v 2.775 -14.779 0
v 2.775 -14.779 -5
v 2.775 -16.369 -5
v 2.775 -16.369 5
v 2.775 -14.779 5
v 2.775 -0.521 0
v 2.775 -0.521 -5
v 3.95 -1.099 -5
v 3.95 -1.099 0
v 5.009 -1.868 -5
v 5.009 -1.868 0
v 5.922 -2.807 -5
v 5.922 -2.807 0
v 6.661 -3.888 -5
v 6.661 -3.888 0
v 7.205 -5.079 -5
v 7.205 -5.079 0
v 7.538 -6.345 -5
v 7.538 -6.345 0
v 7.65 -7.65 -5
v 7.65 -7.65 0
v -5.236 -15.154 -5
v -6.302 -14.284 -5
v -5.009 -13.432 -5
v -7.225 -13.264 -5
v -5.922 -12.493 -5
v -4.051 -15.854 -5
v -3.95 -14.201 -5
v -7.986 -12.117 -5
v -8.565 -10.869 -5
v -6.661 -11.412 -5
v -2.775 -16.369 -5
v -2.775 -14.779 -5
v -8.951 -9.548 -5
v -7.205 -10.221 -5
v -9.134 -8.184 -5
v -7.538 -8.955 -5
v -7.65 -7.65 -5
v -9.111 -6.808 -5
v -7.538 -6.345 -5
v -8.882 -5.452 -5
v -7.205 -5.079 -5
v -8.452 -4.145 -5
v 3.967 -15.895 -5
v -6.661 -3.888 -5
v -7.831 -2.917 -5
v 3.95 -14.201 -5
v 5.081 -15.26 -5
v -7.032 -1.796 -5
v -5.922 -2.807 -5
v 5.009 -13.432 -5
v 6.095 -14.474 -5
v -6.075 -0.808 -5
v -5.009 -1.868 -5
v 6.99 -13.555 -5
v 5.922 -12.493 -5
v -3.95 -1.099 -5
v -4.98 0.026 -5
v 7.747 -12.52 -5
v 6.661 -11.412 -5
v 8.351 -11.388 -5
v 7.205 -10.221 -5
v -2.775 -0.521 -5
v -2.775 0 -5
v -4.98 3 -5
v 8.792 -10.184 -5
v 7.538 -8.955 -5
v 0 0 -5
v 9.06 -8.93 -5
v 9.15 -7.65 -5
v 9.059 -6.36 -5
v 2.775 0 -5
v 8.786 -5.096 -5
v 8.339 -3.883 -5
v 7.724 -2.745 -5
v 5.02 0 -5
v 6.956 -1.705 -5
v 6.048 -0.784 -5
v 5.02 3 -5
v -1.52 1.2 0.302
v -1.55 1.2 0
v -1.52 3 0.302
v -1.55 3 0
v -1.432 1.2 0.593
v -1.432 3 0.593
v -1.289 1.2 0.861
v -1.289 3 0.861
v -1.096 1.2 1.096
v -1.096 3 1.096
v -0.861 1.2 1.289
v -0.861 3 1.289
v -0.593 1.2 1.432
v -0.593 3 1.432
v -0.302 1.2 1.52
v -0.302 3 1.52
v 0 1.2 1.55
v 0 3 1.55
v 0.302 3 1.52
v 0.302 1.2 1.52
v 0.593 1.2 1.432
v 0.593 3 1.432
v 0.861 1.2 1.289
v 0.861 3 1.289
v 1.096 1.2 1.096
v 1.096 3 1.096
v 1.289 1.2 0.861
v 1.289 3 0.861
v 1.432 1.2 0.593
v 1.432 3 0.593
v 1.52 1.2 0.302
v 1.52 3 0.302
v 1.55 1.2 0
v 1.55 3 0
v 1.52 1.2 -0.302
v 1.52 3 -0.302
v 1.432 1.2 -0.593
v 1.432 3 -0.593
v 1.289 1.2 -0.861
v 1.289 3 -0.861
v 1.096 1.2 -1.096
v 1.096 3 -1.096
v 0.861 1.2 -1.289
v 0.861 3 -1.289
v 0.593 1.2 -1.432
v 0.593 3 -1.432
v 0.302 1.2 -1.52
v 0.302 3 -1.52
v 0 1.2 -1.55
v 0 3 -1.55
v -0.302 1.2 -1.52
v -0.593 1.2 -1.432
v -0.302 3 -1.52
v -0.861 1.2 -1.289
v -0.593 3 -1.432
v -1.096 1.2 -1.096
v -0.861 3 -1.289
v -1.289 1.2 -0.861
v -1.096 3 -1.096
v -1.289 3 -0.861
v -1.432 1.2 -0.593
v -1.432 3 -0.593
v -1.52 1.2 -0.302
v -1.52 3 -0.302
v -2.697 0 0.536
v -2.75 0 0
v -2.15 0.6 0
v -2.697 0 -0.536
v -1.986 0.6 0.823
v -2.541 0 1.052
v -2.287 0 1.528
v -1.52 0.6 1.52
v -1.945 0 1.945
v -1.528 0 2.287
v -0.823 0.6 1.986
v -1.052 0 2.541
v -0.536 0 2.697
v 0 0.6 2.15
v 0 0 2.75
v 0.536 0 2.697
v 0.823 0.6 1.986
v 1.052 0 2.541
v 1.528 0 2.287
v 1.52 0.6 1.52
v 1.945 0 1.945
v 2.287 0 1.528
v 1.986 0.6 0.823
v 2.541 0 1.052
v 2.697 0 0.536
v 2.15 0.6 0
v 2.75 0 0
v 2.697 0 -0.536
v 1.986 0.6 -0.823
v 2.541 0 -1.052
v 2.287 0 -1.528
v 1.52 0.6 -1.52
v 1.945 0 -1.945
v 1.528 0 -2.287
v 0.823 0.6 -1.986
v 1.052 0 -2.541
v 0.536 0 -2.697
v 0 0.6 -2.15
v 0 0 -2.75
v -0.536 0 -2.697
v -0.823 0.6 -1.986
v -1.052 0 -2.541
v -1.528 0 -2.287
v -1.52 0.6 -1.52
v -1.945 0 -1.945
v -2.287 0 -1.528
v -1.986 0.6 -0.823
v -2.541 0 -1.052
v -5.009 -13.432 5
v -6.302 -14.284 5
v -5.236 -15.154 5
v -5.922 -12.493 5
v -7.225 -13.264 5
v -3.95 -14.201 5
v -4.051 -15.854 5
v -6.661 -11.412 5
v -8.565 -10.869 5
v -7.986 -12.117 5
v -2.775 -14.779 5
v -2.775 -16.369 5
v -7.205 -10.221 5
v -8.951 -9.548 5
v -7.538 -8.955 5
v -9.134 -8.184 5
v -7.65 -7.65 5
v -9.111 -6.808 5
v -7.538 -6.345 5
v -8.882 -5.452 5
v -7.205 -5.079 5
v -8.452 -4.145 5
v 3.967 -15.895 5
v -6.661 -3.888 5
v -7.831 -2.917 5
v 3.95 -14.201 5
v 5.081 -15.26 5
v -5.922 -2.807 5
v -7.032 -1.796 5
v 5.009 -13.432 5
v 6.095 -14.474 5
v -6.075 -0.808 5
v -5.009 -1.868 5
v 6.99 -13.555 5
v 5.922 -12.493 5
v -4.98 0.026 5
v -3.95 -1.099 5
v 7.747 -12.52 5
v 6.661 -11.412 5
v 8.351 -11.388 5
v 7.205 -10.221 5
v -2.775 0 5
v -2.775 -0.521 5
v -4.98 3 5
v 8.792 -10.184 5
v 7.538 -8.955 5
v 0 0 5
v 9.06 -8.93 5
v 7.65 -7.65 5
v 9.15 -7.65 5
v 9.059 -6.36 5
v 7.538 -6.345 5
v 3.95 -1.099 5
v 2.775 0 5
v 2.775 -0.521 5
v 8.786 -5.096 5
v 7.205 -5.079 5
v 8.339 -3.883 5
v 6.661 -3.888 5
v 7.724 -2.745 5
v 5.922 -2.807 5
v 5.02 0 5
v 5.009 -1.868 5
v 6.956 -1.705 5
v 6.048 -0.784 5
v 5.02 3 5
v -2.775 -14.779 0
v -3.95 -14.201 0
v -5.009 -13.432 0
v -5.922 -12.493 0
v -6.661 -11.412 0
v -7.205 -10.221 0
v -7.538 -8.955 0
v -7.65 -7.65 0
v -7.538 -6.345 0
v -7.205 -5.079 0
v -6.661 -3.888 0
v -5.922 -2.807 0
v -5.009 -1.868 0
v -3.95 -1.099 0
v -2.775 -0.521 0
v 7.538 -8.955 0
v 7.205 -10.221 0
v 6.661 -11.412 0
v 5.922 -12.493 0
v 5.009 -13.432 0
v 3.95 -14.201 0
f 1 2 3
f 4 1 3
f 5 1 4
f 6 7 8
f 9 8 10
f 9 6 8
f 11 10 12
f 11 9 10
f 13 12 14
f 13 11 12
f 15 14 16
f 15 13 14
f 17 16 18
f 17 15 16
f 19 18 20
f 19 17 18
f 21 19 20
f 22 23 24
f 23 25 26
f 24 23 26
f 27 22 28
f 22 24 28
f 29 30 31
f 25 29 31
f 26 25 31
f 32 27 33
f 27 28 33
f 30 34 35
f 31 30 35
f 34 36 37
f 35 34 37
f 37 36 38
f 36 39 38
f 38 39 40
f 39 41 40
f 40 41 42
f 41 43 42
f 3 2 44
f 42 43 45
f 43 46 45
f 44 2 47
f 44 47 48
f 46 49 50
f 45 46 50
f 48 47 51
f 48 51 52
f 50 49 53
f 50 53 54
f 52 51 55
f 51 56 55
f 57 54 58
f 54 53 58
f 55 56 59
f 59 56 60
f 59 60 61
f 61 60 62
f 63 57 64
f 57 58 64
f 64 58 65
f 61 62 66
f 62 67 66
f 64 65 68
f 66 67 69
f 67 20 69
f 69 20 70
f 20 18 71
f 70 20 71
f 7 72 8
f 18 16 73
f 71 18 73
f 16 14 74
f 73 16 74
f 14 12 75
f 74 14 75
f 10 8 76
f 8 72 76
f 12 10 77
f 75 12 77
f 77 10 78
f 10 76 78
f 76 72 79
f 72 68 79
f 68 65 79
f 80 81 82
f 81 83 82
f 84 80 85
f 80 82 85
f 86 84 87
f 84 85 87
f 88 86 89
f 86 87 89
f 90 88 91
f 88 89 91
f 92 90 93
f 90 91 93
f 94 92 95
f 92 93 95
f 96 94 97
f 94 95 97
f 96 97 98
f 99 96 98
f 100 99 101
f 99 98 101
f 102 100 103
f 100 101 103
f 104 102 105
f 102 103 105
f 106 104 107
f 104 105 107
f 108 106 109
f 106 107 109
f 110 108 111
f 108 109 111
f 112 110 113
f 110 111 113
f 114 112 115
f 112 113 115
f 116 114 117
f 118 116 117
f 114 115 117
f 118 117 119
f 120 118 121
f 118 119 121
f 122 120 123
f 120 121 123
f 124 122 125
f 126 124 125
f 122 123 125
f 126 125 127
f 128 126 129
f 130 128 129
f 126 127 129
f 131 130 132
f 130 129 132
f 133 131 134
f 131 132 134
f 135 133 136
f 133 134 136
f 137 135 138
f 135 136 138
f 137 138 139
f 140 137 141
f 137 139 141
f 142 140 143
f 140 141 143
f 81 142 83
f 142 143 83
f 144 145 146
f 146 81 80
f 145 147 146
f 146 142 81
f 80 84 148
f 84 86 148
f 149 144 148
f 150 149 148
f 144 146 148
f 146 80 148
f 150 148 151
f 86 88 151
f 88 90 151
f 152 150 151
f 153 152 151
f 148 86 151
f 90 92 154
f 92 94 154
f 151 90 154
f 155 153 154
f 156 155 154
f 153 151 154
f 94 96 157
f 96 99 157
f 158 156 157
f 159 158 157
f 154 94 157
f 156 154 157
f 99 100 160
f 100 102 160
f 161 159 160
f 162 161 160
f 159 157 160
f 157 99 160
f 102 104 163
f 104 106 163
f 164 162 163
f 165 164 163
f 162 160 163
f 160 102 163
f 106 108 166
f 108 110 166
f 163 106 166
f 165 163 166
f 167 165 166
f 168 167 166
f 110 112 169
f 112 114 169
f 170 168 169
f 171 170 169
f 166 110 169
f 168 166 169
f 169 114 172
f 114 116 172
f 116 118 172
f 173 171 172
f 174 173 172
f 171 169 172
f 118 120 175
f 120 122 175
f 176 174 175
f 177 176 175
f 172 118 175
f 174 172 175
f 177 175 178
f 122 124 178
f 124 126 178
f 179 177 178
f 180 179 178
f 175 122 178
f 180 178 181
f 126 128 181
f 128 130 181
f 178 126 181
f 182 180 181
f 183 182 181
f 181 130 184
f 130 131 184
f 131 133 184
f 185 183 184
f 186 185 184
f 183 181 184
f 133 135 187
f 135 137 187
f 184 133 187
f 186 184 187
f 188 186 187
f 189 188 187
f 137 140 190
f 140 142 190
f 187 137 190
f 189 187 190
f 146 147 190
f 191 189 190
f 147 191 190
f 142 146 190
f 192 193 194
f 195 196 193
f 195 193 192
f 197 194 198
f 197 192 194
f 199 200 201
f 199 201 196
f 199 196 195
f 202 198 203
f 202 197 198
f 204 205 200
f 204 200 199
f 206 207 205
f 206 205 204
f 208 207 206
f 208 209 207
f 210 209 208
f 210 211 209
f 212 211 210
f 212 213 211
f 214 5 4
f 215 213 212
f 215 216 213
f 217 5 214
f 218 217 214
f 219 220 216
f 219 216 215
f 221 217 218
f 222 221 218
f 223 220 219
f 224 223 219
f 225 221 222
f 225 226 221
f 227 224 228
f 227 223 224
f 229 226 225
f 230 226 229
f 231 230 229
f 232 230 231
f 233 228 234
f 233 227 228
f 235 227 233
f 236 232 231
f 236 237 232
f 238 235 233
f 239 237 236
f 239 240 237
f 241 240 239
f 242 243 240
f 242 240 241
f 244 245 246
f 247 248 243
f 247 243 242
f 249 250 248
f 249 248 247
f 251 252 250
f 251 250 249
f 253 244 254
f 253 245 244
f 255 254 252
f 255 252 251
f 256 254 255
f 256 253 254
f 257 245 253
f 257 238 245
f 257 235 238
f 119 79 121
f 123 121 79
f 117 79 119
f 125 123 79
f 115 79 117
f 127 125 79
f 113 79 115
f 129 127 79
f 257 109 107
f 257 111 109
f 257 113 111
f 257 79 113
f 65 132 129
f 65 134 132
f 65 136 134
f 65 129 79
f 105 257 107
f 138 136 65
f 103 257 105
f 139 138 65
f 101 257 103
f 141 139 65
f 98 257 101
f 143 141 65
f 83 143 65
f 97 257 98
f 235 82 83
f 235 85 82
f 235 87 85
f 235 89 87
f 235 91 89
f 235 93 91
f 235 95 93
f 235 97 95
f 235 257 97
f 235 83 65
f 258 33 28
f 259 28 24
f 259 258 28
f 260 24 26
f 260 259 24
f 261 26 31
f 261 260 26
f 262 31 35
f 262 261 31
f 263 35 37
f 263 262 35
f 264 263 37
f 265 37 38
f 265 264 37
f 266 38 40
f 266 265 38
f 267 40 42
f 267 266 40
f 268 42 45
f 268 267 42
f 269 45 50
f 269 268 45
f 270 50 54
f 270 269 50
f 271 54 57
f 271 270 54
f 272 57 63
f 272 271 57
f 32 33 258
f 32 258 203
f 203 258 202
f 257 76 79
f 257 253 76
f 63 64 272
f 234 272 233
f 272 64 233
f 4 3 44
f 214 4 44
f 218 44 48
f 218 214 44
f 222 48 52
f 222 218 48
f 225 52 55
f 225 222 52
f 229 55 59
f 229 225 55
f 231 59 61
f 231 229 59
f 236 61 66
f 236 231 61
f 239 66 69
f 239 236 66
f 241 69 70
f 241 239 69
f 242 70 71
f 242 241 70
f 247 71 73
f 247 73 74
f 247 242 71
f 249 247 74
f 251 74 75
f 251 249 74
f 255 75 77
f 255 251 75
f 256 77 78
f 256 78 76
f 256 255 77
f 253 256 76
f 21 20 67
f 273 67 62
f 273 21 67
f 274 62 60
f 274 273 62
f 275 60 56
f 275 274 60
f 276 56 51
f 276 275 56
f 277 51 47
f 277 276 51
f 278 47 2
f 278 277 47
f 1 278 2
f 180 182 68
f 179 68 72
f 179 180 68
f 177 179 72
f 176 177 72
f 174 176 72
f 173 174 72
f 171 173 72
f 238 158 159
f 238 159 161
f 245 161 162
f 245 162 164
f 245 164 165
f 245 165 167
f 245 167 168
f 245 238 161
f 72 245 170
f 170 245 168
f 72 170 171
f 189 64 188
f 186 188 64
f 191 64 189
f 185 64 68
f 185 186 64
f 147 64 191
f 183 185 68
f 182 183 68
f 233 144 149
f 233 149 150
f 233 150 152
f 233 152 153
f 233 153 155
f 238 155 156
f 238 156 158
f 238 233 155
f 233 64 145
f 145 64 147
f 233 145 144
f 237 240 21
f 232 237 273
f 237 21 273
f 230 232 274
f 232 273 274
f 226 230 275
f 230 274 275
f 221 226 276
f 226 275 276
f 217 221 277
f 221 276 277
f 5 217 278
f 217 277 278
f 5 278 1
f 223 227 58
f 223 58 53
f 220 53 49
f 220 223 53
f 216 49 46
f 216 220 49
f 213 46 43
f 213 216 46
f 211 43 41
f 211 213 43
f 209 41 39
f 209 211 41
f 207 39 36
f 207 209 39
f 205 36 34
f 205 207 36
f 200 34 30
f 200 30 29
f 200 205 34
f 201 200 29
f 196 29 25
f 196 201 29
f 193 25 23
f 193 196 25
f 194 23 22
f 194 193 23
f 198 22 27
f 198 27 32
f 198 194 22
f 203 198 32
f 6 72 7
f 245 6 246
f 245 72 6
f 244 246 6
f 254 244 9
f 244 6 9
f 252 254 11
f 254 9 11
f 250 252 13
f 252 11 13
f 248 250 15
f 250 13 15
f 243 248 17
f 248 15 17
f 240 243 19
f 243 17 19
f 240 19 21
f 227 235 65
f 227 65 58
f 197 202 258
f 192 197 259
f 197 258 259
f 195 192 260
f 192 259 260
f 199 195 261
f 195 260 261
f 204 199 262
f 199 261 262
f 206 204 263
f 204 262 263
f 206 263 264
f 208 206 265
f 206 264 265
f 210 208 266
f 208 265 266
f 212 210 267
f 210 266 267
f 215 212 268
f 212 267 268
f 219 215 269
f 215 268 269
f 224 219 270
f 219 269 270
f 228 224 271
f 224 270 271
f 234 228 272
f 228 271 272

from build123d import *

# Parameters (mm, degrees)
F1_DEPTH       = 5
F1_DEPTH_BACK  = 5
F2_W           = 5.55
F2_H           = 10
F3_DEPTH       = 25
F5_D           = 3.1
F5_CSINK_D     = 5.5
F5_CSINK_ANGLE = 90


with BuildPart() as f1:
    # F0 (on Top) → F1 (new body, two sides)
    with BuildSketch(Plane.XY) as f1_sk:
        with BuildLine():
            Line((5.0199601592, 0), (5.0199601592, 3))
            Line((5.0199601592, 3), (-4.9800398408, 3))
            Line((-4.9800398408, 3), (-4.9800398408, 0.0260473672))
            ThreePointArc((-4.9800398408, 0.0260473672), (0.0238332602, 1.4999689604), (5.0199601592, 0))
        make_face()
        with BuildLine():
            ThreePointArc((9.15, -7.65), (8.0515568512, -3.3031698594), (5.0199601592, 0))
            Line((5.0199601592, 0), (0, 0))
            Line((0, 0), (-4.9800398408, 0))
            Line((-4.9800398408, 0), (-4.9800398408, 0.0260473672))
            ThreePointArc((-4.9800398408, 0.0260473672), (-4.3677875095, -15.6902072282), (9.15, -7.65))
        make_face()
        with BuildLine():
            ThreePointArc((7.65, -7.65), (-5.4093668761, -13.0593668761), (0, 0))
            ThreePointArc((0, 0), (5.4093668761, -2.2406331239), (7.65, -7.65))
        make_face(mode=Mode.SUBTRACT)
        with BuildLine():
            Line((0, 0), (5.0199601592, 0))
            ThreePointArc((5.0199601592, 0), (0.0238332602, 1.4999689604), (-4.9800398408, 0.0260473672))
            Line((-4.9800398408, 0.0260473672), (-4.9800398408, 0))
            Line((-4.9800398408, 0), (0, 0))
        make_face()
    extrude(amount=F1_DEPTH)
    extrude(f1_sk.sketch, amount=-F1_DEPTH_BACK)

    # F2 (on Front) → F3 (cut)
    with BuildSketch(Plane.XZ):
        Rectangle(F2_W, F2_H)
    extrude(amount=F3_DEPTH, mode=Mode.SUBTRACT)

    # F5 (through all)
    with Locations(Plane.XZ):
        with Locations((0, 0)):
            CounterSinkHole(F5_D / 2, F5_CSINK_D / 2, counter_sink_angle=F5_CSINK_ANGLE)


solid = f1.part
